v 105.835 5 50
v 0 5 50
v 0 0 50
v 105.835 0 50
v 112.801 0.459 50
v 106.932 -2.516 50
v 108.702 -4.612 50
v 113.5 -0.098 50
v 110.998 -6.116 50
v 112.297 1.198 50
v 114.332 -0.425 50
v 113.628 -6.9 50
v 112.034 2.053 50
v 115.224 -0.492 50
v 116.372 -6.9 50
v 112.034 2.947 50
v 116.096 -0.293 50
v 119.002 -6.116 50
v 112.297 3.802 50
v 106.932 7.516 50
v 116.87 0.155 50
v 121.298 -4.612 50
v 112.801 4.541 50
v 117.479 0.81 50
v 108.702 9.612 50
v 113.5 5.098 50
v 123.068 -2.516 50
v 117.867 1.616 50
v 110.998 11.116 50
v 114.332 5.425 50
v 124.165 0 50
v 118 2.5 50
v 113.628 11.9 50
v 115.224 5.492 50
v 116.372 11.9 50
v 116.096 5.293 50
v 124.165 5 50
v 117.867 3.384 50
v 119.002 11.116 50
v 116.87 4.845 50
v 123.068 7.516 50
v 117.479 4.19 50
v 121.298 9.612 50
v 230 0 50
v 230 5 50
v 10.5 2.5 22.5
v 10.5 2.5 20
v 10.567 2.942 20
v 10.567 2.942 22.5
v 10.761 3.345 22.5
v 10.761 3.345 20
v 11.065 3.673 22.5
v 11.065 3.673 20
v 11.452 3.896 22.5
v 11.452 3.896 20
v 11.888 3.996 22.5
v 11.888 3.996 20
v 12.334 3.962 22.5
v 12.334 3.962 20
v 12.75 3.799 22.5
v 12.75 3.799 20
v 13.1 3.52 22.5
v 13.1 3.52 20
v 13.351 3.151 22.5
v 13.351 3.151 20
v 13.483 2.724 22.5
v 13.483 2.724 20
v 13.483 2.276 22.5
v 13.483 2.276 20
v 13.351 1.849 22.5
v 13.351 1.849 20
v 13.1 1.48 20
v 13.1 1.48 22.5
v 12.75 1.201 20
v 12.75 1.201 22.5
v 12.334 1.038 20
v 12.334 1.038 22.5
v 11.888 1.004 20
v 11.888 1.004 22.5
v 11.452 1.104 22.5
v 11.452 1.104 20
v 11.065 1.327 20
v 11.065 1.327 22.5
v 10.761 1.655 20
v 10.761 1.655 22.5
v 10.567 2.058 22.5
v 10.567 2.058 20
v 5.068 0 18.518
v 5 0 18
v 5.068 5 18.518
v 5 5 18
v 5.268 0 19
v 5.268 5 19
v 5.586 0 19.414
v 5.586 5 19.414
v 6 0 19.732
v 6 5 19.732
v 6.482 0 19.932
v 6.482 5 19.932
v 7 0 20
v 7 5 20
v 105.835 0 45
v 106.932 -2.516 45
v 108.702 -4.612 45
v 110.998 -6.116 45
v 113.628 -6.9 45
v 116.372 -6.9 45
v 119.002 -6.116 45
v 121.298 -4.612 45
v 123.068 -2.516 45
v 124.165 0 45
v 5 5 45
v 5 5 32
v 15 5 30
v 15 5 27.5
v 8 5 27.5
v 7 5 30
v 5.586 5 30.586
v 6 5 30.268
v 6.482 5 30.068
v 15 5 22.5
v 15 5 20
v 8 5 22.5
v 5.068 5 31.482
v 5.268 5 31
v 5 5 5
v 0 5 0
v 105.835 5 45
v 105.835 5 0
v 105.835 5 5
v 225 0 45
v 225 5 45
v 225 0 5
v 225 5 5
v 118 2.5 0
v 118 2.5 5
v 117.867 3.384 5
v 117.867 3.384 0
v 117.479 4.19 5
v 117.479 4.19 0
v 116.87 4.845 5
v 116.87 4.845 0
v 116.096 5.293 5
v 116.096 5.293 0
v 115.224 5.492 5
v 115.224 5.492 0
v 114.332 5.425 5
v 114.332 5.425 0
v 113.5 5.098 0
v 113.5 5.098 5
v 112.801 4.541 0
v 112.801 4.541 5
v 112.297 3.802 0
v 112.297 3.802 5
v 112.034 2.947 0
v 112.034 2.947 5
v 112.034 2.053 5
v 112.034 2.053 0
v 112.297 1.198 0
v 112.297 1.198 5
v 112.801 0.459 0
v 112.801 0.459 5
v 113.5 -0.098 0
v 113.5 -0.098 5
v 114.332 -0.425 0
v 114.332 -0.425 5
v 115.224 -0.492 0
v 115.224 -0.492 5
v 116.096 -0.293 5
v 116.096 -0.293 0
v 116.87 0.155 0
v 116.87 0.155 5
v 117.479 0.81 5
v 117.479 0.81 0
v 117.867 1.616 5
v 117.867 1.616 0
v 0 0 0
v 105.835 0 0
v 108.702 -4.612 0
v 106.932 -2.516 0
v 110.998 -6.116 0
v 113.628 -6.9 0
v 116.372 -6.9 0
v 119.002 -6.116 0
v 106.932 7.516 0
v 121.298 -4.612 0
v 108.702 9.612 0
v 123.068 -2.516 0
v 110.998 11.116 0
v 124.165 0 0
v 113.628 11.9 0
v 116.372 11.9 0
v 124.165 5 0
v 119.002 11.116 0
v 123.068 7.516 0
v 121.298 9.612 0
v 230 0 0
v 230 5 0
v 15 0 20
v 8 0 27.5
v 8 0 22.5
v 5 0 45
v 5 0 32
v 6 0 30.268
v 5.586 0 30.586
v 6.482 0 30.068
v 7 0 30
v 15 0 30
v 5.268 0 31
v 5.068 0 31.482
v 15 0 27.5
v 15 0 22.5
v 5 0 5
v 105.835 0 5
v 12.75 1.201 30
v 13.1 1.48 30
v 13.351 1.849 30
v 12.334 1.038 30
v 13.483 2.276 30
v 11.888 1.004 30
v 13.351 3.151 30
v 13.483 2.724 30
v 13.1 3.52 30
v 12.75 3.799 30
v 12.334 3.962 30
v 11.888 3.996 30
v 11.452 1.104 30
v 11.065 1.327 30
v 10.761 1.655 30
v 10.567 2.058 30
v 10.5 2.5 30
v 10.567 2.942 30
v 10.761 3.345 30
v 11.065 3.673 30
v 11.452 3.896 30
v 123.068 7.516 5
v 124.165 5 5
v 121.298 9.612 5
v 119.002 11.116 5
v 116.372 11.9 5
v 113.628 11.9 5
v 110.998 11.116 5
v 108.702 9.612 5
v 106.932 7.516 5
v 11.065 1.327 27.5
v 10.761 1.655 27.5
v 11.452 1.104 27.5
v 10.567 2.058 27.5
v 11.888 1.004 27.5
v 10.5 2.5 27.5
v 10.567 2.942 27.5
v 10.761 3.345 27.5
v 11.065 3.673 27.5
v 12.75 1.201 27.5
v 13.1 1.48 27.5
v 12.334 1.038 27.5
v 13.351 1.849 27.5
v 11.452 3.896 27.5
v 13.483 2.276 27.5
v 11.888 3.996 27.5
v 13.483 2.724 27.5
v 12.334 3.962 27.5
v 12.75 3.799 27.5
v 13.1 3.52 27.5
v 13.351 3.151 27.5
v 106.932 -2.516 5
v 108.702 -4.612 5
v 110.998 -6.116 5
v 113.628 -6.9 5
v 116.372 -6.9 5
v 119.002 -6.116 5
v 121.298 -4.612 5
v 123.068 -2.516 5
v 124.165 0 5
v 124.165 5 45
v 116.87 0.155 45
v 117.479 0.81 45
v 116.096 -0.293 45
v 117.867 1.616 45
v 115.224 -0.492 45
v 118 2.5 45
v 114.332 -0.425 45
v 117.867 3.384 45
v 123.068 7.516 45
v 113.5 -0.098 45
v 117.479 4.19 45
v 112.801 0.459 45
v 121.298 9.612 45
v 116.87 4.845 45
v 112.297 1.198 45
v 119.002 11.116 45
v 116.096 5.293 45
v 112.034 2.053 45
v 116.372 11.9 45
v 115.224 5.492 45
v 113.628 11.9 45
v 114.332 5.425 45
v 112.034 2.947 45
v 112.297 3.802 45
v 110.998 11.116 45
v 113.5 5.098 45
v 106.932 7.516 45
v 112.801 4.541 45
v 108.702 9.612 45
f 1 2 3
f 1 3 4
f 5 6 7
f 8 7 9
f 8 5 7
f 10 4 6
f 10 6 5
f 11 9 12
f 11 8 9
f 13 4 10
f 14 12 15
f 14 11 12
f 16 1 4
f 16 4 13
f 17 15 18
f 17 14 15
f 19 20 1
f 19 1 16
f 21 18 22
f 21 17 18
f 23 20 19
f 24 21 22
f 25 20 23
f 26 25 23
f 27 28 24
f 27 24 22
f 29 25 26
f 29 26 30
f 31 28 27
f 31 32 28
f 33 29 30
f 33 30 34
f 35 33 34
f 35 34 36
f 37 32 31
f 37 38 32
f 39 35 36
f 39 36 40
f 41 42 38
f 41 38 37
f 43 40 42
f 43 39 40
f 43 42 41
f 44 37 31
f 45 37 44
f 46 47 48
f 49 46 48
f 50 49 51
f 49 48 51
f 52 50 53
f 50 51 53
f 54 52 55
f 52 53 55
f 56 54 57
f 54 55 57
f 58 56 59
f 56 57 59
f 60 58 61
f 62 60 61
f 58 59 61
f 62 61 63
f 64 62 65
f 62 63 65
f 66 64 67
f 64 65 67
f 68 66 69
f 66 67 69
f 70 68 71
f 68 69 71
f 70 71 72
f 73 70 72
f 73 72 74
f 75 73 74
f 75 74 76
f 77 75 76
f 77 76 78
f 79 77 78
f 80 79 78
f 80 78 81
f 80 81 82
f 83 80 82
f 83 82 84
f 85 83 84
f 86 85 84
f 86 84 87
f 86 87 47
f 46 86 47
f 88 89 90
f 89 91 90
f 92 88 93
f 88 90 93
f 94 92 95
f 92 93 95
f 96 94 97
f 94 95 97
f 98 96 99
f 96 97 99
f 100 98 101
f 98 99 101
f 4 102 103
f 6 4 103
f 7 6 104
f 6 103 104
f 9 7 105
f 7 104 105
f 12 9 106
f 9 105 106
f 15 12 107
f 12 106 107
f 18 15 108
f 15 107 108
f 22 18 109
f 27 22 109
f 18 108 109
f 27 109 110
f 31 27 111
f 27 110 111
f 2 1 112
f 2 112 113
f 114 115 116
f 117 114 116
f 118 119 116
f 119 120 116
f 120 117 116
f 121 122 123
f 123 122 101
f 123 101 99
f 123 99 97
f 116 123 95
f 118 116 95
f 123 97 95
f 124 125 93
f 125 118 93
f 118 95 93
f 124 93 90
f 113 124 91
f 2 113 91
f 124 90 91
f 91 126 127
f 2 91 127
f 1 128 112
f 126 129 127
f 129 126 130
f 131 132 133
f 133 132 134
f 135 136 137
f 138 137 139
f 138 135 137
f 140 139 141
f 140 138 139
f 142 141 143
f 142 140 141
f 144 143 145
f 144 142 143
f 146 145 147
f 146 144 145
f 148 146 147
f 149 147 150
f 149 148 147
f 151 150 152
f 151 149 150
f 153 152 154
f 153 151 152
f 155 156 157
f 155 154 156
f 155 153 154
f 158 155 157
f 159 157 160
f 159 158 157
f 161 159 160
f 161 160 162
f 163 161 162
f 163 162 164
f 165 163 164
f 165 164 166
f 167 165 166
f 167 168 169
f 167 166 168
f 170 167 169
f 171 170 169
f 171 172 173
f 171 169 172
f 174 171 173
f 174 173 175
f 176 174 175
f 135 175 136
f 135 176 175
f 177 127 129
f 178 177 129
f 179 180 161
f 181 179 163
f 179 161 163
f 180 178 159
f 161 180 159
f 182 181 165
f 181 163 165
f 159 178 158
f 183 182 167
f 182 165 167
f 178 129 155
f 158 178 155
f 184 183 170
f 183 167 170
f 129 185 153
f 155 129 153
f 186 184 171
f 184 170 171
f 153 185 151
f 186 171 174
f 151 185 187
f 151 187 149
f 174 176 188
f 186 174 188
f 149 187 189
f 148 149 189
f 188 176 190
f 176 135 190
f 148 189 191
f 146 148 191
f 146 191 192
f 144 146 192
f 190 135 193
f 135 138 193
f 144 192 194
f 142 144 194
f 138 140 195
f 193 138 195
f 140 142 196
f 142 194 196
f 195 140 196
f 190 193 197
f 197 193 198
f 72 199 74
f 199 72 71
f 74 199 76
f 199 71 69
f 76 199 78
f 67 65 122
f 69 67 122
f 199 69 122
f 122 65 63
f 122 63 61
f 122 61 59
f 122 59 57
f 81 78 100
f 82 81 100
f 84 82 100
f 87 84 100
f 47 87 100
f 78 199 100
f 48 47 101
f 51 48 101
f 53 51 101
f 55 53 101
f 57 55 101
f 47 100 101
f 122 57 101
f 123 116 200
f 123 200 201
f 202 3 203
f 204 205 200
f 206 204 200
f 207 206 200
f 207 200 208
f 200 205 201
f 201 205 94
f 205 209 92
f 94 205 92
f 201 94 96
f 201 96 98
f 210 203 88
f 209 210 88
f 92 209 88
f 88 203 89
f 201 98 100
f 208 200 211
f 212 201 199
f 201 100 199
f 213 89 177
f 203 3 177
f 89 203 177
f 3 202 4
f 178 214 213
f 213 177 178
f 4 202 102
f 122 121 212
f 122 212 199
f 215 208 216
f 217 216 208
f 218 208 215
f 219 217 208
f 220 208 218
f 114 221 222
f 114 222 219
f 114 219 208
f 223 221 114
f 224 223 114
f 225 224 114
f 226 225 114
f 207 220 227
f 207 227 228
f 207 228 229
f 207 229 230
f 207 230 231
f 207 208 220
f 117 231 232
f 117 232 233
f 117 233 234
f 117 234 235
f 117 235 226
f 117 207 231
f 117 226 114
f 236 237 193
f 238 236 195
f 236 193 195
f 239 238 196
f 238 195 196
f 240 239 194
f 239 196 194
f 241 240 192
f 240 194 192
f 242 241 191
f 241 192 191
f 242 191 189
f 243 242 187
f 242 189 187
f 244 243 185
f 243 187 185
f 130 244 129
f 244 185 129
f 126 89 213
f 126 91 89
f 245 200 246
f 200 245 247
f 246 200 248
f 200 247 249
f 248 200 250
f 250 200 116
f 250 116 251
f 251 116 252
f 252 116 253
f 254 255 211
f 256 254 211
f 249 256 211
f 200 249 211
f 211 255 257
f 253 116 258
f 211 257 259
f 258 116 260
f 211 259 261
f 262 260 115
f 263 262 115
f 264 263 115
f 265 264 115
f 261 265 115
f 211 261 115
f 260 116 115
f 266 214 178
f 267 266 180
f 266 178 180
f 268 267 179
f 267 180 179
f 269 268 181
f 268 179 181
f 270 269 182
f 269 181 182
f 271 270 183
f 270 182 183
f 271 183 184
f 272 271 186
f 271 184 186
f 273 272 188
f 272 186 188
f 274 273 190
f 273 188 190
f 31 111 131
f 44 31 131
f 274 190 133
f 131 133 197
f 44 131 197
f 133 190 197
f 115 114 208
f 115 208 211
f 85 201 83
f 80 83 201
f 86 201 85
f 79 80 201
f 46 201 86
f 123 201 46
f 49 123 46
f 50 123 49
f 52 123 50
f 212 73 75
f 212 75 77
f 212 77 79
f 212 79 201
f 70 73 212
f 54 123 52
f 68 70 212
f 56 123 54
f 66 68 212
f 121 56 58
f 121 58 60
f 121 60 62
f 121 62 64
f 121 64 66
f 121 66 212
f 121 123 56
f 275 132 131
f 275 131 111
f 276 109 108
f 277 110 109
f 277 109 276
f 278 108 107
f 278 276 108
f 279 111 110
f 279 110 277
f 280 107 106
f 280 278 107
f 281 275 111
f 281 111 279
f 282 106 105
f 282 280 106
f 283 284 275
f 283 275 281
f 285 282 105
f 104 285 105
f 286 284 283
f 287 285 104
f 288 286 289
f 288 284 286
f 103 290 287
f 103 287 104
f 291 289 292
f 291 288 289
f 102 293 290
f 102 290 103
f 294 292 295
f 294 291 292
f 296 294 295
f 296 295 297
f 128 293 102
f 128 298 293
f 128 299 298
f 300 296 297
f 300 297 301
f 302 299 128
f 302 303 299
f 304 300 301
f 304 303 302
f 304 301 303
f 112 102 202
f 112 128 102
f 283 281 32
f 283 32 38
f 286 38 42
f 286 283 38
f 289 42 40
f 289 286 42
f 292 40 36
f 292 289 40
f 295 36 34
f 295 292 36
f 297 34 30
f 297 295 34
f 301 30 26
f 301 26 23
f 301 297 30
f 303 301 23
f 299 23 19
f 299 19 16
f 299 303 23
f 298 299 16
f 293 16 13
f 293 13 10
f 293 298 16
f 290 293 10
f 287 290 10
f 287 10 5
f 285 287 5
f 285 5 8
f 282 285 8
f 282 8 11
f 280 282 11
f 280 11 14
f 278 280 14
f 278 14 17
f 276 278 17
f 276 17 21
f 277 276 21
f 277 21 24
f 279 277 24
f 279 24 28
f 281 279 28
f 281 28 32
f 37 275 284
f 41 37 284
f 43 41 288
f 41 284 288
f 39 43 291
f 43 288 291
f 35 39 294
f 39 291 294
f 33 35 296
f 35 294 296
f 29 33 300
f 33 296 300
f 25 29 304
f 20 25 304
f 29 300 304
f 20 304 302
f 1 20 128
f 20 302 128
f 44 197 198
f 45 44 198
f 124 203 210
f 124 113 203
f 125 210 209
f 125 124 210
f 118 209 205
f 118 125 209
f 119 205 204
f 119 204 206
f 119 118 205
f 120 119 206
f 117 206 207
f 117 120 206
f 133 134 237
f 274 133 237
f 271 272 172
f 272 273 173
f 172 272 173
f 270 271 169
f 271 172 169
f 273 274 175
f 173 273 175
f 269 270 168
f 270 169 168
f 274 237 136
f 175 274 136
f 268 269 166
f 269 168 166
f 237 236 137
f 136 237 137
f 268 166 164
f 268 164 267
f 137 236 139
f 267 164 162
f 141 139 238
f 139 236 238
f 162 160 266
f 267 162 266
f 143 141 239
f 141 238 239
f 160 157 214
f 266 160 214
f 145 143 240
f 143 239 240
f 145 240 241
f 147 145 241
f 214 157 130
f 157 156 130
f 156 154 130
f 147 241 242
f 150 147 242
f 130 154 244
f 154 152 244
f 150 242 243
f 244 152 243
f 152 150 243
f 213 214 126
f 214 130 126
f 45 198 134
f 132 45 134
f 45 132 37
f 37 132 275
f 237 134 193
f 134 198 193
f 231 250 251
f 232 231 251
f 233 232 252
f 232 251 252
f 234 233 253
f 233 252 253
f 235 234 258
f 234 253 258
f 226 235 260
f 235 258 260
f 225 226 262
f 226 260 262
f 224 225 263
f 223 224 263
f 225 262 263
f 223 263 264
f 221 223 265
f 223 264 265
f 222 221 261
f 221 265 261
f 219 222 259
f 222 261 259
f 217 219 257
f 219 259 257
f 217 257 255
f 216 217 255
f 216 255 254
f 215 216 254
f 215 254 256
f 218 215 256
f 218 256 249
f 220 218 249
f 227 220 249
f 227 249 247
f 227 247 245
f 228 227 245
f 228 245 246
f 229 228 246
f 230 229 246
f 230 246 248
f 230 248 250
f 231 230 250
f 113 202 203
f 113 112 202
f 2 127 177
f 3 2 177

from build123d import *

# Parameters (mm, degrees)
SKETCH1_R               = 3
BOSS_EXTRUDE1_DEPTH     = 50
CUT_EXTRUDE1_DEPTH      = 236.677746086
CUT_EXTRUDE1_DEPTH_BACK = 236.677746086
SKETCH2_W               = 220
SKETCH2_H               = 40
SKETCH3_W               = 10
SKETCH3_H               = 5
BOSS_EXTRUDE2_DEPTH     = 10
CUT_EXTRUDE2_REACH      = 237.678
SKETCH4_W               = 7
SKETCH4_H               = 5
FILLET1_R               = 2
SKETCH5_R               = 1.5
CUT_EXTRUDE3_DEPTH      = 10


with BuildPart() as part:
    # Sketch1 → Boss-Extrude1 (new body)
    with BuildSketch(Plane.XY):
        with BuildLine():
            Line((124.16515139, 0), (230, 0))
            Line((230, 0), (230, 5))
            Line((230, 5), (124.16515139, 5))
            ThreePointArc((124.16515139, 5), (115, 12), (105.83484861, 5))
            Line((105.83484861, 5), (0, 5))
            Line((0, 5), (0, 0))
            Line((0, 0), (105.83484861, 0))
            ThreePointArc((105.83484861, 0), (115, -7), (124.16515139, 0))
        make_face()
        with Locations((115, 2.5)):
            Circle(SKETCH1_R, mode=Mode.SUBTRACT)
    extrude(amount=BOSS_EXTRUDE1_DEPTH)

    # Sketch2 → Cut-Extrude1 (cut, two sides: drawn at the far end of the back side and taken through both)
    with BuildSketch(Plane(origin=(0, 0, 0), x_dir=(-1, 0, 0), z_dir=(0, -1, 0)).offset(-CUT_EXTRUDE1_DEPTH_BACK)):
        with Locations((-115, -25)):
            Rectangle(SKETCH2_W, SKETCH2_H)
    extrude(amount=CUT_EXTRUDE1_DEPTH + CUT_EXTRUDE1_DEPTH_BACK, mode=Mode.SUBTRACT)

    # Sketch3 → Boss-Extrude2 (add)
    with BuildSketch(Plane(origin=(5, 0, 0), x_dir=(0, 0, -1), z_dir=(1, 0, 0))):
        with Locations((-25, 2.5)):
            Rectangle(SKETCH3_W, SKETCH3_H)
    extrude(amount=BOSS_EXTRUDE2_DEPTH)

    # Sketch4 → Cut-Extrude2 (cut, up to next)
    with BuildSketch(Plane(origin=(0, 5, 0), x_dir=(1, 0, 0), z_dir=(0, 1, 0)), mode=Mode.PRIVATE) as cut_extrude2_sk1:
        with Locations((11.5, -25)):
            Rectangle(SKETCH4_W, SKETCH4_H)
    cut_extrude2_tool1 = extrude(cut_extrude2_sk1.sketch, amount=-CUT_EXTRUDE2_REACH, mode=Mode.PRIVATE) & part.part
    add(cut_extrude2_tool1.solids().sort_by_distance((11.5, 5, 25))[0], mode=Mode.SUBTRACT)

    # Fillet1
    fillet1_edges = [part.edges().sort_by_distance(p)[0] for p in [
        (5, 2.5, 30),
        (5, 2.5, 20),
    ]]
    fillet(fillet1_edges, radius=FILLET1_R)

    # Sketch5 → Cut-Extrude3 (cut)
    with BuildSketch(Plane(origin=(0, 0, 20), x_dir=(-1, 0, 0), z_dir=(0, 0, -1))):
        with Locations((-12, 2.5)):
            Circle(SKETCH5_R)
    extrude(amount=-CUT_EXTRUDE3_DEPTH, mode=Mode.SUBTRACT)


solid = part.part
